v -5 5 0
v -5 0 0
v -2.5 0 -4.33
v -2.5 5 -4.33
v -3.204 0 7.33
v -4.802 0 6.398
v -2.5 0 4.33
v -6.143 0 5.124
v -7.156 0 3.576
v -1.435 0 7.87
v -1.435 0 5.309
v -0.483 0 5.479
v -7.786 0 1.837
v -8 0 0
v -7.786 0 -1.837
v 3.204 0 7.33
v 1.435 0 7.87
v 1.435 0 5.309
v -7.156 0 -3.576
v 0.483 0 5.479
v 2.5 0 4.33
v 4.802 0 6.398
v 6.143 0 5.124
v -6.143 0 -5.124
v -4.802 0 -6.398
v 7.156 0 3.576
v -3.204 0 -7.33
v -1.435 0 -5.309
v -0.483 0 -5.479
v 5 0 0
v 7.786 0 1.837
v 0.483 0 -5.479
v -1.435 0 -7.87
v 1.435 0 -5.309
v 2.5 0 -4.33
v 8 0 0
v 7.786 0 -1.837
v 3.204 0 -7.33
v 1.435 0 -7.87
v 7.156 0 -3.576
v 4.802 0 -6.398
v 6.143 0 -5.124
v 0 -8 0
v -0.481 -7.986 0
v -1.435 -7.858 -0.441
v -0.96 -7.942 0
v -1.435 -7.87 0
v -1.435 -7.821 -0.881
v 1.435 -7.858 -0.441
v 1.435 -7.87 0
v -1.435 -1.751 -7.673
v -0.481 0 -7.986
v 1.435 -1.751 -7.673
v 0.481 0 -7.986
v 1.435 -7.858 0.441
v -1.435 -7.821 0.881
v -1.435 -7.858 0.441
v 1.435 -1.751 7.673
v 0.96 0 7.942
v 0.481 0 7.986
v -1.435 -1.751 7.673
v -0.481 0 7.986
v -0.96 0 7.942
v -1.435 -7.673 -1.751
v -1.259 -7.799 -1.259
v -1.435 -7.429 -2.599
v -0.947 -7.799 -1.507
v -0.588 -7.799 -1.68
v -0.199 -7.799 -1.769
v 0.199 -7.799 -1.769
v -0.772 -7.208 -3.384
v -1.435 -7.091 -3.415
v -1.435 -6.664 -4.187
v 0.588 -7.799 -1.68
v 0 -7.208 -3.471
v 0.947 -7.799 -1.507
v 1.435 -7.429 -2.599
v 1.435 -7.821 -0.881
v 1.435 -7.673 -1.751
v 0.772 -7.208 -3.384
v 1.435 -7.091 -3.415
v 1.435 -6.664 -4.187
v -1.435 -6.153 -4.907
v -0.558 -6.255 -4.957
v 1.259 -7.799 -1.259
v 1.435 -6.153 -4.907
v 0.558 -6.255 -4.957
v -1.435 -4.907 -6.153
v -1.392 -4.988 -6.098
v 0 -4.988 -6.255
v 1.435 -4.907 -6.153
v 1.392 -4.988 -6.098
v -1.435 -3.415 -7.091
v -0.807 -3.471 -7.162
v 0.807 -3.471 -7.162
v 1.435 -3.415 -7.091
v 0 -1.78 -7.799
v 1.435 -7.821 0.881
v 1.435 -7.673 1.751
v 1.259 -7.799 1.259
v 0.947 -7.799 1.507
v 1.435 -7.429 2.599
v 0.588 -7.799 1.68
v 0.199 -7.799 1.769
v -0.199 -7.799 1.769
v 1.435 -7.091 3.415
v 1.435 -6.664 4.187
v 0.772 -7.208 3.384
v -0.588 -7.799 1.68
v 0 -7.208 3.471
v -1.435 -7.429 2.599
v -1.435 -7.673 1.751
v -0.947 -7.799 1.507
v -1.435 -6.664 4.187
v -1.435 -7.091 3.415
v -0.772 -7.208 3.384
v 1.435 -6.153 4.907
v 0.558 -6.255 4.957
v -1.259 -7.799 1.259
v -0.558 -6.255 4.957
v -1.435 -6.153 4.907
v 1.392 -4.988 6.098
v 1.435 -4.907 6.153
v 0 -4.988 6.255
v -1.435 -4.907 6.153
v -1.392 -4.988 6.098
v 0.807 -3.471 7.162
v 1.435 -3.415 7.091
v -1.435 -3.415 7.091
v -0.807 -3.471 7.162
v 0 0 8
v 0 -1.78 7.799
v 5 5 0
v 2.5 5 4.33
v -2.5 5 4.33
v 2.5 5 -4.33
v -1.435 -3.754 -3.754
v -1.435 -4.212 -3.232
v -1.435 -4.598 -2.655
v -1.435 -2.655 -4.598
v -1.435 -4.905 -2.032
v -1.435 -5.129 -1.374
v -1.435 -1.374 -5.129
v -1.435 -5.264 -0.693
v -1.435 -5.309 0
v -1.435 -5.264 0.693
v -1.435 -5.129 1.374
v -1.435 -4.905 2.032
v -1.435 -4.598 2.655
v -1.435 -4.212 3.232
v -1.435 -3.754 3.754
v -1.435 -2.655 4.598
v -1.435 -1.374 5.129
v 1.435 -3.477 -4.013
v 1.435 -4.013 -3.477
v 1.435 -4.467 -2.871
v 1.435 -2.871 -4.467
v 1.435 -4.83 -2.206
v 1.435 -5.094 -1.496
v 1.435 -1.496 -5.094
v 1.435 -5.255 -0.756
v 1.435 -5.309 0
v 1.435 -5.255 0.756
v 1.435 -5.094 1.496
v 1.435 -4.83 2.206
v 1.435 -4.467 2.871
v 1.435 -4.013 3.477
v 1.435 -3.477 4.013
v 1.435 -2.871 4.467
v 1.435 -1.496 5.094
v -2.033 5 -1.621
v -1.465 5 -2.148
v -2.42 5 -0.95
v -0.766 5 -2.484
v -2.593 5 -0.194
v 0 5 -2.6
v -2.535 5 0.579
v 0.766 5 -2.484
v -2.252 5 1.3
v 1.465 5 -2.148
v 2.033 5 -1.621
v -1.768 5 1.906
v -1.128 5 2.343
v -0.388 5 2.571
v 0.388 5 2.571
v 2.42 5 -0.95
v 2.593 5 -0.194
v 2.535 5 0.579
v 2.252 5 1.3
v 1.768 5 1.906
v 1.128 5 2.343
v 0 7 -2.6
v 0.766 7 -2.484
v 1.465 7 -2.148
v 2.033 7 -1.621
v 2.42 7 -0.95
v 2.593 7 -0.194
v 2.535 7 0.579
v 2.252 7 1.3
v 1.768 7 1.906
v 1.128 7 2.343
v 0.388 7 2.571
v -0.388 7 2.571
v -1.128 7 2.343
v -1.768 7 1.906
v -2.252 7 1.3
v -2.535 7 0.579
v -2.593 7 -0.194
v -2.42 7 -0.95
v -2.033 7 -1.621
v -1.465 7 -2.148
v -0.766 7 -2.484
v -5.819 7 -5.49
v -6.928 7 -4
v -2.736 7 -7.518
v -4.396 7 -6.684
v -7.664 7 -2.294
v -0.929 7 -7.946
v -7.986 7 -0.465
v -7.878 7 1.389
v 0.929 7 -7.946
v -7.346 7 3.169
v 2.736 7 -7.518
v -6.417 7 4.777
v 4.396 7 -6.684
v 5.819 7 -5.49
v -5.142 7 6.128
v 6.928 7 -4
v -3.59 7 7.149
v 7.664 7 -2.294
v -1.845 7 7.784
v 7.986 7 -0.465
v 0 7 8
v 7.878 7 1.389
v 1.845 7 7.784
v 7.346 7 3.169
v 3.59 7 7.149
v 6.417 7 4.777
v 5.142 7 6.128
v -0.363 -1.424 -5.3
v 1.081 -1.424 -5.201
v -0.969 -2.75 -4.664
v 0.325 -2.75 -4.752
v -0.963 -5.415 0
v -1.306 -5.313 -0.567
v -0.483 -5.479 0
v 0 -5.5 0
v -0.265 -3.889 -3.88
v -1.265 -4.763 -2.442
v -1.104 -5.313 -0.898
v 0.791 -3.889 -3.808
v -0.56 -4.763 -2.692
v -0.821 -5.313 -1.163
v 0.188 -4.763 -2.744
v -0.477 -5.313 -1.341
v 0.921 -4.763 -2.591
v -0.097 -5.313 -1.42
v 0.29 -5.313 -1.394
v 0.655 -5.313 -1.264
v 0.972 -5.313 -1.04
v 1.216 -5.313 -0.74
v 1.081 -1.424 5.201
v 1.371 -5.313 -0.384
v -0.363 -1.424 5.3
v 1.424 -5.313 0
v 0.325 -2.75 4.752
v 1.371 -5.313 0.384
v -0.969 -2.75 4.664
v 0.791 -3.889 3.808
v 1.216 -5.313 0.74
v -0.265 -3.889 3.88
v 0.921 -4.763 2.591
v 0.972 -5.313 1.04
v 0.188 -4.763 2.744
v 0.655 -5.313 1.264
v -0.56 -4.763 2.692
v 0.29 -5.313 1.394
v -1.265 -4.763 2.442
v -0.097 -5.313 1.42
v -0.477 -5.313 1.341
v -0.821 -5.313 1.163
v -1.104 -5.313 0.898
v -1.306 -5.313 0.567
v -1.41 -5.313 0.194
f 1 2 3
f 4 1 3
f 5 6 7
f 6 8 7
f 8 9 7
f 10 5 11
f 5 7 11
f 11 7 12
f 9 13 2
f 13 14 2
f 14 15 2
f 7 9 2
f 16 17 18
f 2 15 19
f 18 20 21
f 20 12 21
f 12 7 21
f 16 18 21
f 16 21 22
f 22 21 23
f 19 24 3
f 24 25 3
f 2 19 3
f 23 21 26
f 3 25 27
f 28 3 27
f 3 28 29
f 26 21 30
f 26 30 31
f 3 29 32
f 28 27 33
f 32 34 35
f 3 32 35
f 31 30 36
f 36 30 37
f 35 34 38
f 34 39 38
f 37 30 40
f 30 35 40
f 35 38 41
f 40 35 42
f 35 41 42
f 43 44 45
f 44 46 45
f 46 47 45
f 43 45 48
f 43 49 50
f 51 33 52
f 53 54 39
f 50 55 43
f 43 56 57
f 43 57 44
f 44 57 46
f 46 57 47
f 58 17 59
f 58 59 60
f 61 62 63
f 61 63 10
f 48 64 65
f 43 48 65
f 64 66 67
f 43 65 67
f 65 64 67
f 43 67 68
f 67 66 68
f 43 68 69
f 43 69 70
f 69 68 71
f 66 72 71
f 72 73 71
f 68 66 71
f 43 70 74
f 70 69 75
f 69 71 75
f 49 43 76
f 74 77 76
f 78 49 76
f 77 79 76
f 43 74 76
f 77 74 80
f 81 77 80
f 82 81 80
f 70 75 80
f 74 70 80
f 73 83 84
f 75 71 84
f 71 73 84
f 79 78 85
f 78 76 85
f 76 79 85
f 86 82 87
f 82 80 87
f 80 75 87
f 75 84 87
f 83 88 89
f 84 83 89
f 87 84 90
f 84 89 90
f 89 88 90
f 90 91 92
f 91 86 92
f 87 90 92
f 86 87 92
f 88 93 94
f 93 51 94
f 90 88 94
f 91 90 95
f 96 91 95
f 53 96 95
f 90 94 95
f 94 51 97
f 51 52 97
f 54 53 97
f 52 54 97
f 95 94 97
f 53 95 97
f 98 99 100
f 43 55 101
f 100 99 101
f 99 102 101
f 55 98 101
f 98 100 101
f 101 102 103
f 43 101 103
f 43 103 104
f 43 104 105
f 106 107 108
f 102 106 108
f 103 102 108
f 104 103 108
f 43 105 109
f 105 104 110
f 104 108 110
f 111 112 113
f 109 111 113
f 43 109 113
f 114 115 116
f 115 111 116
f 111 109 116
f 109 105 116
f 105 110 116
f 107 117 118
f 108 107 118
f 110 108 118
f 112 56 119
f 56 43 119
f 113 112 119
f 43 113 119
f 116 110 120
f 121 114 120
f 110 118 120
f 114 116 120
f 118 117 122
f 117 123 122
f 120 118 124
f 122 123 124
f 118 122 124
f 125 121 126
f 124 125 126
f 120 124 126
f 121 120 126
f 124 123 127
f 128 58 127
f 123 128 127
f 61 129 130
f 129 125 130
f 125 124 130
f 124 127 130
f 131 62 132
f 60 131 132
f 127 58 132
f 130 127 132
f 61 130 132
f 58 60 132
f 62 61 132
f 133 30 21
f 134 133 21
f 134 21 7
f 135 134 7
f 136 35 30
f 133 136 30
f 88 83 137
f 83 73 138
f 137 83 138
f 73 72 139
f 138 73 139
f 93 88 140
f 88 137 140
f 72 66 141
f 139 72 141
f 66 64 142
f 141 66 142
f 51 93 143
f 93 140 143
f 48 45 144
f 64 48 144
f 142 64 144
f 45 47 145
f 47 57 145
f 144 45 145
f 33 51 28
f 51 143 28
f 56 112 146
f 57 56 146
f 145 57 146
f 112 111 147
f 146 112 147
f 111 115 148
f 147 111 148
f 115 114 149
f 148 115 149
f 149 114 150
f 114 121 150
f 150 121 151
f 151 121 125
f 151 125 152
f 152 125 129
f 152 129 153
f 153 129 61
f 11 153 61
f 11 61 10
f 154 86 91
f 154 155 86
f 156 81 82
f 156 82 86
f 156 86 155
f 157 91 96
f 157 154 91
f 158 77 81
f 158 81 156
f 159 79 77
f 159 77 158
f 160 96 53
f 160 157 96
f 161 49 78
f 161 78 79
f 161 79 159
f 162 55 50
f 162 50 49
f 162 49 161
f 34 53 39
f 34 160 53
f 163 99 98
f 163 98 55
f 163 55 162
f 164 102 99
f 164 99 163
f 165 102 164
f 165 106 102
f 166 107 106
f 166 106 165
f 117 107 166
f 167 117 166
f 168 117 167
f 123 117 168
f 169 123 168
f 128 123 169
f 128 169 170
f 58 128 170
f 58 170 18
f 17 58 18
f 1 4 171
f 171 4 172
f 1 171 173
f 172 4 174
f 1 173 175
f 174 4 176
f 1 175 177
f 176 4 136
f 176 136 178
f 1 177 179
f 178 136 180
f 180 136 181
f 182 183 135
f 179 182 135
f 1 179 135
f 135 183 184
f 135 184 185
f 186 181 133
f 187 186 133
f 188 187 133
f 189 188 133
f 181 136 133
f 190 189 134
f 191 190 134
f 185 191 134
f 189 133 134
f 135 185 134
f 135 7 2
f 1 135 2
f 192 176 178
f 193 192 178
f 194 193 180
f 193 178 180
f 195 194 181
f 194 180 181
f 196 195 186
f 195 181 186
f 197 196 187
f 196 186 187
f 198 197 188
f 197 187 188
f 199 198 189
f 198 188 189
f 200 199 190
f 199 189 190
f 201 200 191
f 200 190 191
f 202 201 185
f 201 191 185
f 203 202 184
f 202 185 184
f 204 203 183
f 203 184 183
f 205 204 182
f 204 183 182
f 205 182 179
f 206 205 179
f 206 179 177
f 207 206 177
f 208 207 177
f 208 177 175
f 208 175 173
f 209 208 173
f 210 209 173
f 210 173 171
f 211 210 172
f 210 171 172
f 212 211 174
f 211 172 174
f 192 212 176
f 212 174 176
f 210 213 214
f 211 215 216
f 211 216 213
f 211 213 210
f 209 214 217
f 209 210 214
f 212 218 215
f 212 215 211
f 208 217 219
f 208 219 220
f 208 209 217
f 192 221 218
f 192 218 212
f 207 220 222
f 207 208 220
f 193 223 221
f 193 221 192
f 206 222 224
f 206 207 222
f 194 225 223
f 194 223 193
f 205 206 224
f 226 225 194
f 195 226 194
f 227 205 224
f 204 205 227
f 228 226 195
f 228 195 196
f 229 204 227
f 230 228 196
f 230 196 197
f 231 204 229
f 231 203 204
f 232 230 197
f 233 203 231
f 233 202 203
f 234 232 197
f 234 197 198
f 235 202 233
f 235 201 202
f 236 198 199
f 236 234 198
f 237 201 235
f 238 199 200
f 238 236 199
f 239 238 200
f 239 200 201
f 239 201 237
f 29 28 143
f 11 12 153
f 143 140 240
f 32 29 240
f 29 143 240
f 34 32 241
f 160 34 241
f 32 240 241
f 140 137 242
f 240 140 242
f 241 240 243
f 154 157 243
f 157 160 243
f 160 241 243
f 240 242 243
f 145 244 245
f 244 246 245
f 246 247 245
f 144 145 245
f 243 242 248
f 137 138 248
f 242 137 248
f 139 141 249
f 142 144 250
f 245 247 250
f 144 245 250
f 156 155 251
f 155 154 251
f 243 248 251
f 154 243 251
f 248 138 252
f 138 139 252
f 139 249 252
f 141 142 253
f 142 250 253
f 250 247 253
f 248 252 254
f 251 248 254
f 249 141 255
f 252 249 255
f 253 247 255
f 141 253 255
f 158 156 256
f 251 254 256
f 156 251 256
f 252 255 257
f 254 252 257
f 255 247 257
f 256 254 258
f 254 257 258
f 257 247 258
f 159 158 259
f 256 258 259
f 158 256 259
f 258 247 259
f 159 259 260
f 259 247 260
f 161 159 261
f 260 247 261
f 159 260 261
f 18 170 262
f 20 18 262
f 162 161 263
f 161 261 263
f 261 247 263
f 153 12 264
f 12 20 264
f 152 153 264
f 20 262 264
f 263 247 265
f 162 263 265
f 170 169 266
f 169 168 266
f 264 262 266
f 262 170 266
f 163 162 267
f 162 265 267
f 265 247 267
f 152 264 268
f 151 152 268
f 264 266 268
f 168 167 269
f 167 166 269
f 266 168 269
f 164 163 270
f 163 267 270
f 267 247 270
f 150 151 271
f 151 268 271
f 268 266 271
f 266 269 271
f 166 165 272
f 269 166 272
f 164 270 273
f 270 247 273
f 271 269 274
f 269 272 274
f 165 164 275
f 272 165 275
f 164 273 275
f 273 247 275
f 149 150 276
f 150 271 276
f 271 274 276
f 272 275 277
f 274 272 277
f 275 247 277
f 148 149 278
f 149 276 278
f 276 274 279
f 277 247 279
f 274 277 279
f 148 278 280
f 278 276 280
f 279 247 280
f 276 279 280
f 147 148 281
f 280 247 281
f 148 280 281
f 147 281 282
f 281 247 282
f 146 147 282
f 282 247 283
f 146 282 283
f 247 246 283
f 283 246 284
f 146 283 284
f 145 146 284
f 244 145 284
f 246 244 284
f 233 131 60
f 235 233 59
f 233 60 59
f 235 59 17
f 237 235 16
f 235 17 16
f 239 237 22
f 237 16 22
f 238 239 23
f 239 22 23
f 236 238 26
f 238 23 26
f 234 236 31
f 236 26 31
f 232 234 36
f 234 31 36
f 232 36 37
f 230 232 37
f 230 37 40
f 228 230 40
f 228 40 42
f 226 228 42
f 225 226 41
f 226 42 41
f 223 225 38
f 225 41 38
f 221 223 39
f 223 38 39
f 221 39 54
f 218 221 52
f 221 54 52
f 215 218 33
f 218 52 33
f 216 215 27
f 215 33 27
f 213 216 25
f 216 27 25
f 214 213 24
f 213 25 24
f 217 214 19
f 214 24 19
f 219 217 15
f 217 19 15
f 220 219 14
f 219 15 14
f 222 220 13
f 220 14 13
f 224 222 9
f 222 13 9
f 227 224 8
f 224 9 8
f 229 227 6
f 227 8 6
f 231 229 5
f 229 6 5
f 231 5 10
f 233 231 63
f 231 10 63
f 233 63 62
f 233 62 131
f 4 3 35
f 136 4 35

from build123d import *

# Parameters (mm, degrees)
SKETCH1_R           = 8
BOSS_EXTRUDE1_DEPTH = 5
SKETCH2_R           = 8
BOSS_EXTRUDE2_DEPTH = 2
SKETCH3_R           = 2.6
CUT_EXTRUDE1_DEPTH  = 2
SKETCH6_W           = 7.287885745
SKETCH6_H           = 18.210888192
SKETCH6_W_2         = 7.49722984
CUT_EXTRUDE2_DEPTH  = 8


with BuildPart() as part:
    # Sketch1 → Boss-Extrude1 (new body)
    with BuildSketch(Plane(origin=(0, 0, 0), x_dir=(1, 0, 0), z_dir=(0, 1, 0))):
        Circle(SKETCH1_R)
        Polygon((-2.5, 4.330127019), (2.5, 4.330127019), (5, 0), (2.5, -4.330127019), (-2.5, -4.330127019), (-5, 0), align=None, mode=Mode.SUBTRACT)
    extrude(amount=BOSS_EXTRUDE1_DEPTH)

    # Sketch2 → Boss-Extrude2 (add)
    with BuildSketch(Plane(origin=(0, 5, 0), x_dir=(1, 0, 0), z_dir=(0, 1, 0))):
        Circle(SKETCH2_R)
    extrude(amount=BOSS_EXTRUDE2_DEPTH)

    # Sketch3 → Cut-Extrude1 (cut)
    with BuildSketch(Plane.XZ.offset(-5)):
        Circle(SKETCH3_R)
    extrude(amount=-CUT_EXTRUDE1_DEPTH, mode=Mode.SUBTRACT)

    # Sketch5 → Revolve1 (revolve)
    with BuildSketch(Plane.XY):
        with BuildLine():
            Line((-8, 0), (-5.5, 0))
            ThreePointArc((-5.5, 0), (-3.889087297, -3.889087297), (0, -5.5))
            Line((0, -5.5), (0, -8))
            ThreePointArc((0, -8), (-5.656854249, -5.656854249), (-8, 0))
        make_face()
    revolve(axis=Axis((0, 5, 0), (0, -1, 0)))

    # Sketch6 → Cut-Extrude2 (cut)
    with BuildSketch(Plane(origin=(0, 0, 0), x_dir=(-1, 0, 0), z_dir=(0, -1, 0))):
        with Locations((5.079146944, 0)):
            Rectangle(SKETCH6_W, SKETCH6_H)
        with Locations((-5.183818992, 0)):
            Rectangle(SKETCH6_W_2, SKETCH6_H)
    extrude(amount=CUT_EXTRUDE2_DEPTH, mode=Mode.SUBTRACT)


solid = part.part
